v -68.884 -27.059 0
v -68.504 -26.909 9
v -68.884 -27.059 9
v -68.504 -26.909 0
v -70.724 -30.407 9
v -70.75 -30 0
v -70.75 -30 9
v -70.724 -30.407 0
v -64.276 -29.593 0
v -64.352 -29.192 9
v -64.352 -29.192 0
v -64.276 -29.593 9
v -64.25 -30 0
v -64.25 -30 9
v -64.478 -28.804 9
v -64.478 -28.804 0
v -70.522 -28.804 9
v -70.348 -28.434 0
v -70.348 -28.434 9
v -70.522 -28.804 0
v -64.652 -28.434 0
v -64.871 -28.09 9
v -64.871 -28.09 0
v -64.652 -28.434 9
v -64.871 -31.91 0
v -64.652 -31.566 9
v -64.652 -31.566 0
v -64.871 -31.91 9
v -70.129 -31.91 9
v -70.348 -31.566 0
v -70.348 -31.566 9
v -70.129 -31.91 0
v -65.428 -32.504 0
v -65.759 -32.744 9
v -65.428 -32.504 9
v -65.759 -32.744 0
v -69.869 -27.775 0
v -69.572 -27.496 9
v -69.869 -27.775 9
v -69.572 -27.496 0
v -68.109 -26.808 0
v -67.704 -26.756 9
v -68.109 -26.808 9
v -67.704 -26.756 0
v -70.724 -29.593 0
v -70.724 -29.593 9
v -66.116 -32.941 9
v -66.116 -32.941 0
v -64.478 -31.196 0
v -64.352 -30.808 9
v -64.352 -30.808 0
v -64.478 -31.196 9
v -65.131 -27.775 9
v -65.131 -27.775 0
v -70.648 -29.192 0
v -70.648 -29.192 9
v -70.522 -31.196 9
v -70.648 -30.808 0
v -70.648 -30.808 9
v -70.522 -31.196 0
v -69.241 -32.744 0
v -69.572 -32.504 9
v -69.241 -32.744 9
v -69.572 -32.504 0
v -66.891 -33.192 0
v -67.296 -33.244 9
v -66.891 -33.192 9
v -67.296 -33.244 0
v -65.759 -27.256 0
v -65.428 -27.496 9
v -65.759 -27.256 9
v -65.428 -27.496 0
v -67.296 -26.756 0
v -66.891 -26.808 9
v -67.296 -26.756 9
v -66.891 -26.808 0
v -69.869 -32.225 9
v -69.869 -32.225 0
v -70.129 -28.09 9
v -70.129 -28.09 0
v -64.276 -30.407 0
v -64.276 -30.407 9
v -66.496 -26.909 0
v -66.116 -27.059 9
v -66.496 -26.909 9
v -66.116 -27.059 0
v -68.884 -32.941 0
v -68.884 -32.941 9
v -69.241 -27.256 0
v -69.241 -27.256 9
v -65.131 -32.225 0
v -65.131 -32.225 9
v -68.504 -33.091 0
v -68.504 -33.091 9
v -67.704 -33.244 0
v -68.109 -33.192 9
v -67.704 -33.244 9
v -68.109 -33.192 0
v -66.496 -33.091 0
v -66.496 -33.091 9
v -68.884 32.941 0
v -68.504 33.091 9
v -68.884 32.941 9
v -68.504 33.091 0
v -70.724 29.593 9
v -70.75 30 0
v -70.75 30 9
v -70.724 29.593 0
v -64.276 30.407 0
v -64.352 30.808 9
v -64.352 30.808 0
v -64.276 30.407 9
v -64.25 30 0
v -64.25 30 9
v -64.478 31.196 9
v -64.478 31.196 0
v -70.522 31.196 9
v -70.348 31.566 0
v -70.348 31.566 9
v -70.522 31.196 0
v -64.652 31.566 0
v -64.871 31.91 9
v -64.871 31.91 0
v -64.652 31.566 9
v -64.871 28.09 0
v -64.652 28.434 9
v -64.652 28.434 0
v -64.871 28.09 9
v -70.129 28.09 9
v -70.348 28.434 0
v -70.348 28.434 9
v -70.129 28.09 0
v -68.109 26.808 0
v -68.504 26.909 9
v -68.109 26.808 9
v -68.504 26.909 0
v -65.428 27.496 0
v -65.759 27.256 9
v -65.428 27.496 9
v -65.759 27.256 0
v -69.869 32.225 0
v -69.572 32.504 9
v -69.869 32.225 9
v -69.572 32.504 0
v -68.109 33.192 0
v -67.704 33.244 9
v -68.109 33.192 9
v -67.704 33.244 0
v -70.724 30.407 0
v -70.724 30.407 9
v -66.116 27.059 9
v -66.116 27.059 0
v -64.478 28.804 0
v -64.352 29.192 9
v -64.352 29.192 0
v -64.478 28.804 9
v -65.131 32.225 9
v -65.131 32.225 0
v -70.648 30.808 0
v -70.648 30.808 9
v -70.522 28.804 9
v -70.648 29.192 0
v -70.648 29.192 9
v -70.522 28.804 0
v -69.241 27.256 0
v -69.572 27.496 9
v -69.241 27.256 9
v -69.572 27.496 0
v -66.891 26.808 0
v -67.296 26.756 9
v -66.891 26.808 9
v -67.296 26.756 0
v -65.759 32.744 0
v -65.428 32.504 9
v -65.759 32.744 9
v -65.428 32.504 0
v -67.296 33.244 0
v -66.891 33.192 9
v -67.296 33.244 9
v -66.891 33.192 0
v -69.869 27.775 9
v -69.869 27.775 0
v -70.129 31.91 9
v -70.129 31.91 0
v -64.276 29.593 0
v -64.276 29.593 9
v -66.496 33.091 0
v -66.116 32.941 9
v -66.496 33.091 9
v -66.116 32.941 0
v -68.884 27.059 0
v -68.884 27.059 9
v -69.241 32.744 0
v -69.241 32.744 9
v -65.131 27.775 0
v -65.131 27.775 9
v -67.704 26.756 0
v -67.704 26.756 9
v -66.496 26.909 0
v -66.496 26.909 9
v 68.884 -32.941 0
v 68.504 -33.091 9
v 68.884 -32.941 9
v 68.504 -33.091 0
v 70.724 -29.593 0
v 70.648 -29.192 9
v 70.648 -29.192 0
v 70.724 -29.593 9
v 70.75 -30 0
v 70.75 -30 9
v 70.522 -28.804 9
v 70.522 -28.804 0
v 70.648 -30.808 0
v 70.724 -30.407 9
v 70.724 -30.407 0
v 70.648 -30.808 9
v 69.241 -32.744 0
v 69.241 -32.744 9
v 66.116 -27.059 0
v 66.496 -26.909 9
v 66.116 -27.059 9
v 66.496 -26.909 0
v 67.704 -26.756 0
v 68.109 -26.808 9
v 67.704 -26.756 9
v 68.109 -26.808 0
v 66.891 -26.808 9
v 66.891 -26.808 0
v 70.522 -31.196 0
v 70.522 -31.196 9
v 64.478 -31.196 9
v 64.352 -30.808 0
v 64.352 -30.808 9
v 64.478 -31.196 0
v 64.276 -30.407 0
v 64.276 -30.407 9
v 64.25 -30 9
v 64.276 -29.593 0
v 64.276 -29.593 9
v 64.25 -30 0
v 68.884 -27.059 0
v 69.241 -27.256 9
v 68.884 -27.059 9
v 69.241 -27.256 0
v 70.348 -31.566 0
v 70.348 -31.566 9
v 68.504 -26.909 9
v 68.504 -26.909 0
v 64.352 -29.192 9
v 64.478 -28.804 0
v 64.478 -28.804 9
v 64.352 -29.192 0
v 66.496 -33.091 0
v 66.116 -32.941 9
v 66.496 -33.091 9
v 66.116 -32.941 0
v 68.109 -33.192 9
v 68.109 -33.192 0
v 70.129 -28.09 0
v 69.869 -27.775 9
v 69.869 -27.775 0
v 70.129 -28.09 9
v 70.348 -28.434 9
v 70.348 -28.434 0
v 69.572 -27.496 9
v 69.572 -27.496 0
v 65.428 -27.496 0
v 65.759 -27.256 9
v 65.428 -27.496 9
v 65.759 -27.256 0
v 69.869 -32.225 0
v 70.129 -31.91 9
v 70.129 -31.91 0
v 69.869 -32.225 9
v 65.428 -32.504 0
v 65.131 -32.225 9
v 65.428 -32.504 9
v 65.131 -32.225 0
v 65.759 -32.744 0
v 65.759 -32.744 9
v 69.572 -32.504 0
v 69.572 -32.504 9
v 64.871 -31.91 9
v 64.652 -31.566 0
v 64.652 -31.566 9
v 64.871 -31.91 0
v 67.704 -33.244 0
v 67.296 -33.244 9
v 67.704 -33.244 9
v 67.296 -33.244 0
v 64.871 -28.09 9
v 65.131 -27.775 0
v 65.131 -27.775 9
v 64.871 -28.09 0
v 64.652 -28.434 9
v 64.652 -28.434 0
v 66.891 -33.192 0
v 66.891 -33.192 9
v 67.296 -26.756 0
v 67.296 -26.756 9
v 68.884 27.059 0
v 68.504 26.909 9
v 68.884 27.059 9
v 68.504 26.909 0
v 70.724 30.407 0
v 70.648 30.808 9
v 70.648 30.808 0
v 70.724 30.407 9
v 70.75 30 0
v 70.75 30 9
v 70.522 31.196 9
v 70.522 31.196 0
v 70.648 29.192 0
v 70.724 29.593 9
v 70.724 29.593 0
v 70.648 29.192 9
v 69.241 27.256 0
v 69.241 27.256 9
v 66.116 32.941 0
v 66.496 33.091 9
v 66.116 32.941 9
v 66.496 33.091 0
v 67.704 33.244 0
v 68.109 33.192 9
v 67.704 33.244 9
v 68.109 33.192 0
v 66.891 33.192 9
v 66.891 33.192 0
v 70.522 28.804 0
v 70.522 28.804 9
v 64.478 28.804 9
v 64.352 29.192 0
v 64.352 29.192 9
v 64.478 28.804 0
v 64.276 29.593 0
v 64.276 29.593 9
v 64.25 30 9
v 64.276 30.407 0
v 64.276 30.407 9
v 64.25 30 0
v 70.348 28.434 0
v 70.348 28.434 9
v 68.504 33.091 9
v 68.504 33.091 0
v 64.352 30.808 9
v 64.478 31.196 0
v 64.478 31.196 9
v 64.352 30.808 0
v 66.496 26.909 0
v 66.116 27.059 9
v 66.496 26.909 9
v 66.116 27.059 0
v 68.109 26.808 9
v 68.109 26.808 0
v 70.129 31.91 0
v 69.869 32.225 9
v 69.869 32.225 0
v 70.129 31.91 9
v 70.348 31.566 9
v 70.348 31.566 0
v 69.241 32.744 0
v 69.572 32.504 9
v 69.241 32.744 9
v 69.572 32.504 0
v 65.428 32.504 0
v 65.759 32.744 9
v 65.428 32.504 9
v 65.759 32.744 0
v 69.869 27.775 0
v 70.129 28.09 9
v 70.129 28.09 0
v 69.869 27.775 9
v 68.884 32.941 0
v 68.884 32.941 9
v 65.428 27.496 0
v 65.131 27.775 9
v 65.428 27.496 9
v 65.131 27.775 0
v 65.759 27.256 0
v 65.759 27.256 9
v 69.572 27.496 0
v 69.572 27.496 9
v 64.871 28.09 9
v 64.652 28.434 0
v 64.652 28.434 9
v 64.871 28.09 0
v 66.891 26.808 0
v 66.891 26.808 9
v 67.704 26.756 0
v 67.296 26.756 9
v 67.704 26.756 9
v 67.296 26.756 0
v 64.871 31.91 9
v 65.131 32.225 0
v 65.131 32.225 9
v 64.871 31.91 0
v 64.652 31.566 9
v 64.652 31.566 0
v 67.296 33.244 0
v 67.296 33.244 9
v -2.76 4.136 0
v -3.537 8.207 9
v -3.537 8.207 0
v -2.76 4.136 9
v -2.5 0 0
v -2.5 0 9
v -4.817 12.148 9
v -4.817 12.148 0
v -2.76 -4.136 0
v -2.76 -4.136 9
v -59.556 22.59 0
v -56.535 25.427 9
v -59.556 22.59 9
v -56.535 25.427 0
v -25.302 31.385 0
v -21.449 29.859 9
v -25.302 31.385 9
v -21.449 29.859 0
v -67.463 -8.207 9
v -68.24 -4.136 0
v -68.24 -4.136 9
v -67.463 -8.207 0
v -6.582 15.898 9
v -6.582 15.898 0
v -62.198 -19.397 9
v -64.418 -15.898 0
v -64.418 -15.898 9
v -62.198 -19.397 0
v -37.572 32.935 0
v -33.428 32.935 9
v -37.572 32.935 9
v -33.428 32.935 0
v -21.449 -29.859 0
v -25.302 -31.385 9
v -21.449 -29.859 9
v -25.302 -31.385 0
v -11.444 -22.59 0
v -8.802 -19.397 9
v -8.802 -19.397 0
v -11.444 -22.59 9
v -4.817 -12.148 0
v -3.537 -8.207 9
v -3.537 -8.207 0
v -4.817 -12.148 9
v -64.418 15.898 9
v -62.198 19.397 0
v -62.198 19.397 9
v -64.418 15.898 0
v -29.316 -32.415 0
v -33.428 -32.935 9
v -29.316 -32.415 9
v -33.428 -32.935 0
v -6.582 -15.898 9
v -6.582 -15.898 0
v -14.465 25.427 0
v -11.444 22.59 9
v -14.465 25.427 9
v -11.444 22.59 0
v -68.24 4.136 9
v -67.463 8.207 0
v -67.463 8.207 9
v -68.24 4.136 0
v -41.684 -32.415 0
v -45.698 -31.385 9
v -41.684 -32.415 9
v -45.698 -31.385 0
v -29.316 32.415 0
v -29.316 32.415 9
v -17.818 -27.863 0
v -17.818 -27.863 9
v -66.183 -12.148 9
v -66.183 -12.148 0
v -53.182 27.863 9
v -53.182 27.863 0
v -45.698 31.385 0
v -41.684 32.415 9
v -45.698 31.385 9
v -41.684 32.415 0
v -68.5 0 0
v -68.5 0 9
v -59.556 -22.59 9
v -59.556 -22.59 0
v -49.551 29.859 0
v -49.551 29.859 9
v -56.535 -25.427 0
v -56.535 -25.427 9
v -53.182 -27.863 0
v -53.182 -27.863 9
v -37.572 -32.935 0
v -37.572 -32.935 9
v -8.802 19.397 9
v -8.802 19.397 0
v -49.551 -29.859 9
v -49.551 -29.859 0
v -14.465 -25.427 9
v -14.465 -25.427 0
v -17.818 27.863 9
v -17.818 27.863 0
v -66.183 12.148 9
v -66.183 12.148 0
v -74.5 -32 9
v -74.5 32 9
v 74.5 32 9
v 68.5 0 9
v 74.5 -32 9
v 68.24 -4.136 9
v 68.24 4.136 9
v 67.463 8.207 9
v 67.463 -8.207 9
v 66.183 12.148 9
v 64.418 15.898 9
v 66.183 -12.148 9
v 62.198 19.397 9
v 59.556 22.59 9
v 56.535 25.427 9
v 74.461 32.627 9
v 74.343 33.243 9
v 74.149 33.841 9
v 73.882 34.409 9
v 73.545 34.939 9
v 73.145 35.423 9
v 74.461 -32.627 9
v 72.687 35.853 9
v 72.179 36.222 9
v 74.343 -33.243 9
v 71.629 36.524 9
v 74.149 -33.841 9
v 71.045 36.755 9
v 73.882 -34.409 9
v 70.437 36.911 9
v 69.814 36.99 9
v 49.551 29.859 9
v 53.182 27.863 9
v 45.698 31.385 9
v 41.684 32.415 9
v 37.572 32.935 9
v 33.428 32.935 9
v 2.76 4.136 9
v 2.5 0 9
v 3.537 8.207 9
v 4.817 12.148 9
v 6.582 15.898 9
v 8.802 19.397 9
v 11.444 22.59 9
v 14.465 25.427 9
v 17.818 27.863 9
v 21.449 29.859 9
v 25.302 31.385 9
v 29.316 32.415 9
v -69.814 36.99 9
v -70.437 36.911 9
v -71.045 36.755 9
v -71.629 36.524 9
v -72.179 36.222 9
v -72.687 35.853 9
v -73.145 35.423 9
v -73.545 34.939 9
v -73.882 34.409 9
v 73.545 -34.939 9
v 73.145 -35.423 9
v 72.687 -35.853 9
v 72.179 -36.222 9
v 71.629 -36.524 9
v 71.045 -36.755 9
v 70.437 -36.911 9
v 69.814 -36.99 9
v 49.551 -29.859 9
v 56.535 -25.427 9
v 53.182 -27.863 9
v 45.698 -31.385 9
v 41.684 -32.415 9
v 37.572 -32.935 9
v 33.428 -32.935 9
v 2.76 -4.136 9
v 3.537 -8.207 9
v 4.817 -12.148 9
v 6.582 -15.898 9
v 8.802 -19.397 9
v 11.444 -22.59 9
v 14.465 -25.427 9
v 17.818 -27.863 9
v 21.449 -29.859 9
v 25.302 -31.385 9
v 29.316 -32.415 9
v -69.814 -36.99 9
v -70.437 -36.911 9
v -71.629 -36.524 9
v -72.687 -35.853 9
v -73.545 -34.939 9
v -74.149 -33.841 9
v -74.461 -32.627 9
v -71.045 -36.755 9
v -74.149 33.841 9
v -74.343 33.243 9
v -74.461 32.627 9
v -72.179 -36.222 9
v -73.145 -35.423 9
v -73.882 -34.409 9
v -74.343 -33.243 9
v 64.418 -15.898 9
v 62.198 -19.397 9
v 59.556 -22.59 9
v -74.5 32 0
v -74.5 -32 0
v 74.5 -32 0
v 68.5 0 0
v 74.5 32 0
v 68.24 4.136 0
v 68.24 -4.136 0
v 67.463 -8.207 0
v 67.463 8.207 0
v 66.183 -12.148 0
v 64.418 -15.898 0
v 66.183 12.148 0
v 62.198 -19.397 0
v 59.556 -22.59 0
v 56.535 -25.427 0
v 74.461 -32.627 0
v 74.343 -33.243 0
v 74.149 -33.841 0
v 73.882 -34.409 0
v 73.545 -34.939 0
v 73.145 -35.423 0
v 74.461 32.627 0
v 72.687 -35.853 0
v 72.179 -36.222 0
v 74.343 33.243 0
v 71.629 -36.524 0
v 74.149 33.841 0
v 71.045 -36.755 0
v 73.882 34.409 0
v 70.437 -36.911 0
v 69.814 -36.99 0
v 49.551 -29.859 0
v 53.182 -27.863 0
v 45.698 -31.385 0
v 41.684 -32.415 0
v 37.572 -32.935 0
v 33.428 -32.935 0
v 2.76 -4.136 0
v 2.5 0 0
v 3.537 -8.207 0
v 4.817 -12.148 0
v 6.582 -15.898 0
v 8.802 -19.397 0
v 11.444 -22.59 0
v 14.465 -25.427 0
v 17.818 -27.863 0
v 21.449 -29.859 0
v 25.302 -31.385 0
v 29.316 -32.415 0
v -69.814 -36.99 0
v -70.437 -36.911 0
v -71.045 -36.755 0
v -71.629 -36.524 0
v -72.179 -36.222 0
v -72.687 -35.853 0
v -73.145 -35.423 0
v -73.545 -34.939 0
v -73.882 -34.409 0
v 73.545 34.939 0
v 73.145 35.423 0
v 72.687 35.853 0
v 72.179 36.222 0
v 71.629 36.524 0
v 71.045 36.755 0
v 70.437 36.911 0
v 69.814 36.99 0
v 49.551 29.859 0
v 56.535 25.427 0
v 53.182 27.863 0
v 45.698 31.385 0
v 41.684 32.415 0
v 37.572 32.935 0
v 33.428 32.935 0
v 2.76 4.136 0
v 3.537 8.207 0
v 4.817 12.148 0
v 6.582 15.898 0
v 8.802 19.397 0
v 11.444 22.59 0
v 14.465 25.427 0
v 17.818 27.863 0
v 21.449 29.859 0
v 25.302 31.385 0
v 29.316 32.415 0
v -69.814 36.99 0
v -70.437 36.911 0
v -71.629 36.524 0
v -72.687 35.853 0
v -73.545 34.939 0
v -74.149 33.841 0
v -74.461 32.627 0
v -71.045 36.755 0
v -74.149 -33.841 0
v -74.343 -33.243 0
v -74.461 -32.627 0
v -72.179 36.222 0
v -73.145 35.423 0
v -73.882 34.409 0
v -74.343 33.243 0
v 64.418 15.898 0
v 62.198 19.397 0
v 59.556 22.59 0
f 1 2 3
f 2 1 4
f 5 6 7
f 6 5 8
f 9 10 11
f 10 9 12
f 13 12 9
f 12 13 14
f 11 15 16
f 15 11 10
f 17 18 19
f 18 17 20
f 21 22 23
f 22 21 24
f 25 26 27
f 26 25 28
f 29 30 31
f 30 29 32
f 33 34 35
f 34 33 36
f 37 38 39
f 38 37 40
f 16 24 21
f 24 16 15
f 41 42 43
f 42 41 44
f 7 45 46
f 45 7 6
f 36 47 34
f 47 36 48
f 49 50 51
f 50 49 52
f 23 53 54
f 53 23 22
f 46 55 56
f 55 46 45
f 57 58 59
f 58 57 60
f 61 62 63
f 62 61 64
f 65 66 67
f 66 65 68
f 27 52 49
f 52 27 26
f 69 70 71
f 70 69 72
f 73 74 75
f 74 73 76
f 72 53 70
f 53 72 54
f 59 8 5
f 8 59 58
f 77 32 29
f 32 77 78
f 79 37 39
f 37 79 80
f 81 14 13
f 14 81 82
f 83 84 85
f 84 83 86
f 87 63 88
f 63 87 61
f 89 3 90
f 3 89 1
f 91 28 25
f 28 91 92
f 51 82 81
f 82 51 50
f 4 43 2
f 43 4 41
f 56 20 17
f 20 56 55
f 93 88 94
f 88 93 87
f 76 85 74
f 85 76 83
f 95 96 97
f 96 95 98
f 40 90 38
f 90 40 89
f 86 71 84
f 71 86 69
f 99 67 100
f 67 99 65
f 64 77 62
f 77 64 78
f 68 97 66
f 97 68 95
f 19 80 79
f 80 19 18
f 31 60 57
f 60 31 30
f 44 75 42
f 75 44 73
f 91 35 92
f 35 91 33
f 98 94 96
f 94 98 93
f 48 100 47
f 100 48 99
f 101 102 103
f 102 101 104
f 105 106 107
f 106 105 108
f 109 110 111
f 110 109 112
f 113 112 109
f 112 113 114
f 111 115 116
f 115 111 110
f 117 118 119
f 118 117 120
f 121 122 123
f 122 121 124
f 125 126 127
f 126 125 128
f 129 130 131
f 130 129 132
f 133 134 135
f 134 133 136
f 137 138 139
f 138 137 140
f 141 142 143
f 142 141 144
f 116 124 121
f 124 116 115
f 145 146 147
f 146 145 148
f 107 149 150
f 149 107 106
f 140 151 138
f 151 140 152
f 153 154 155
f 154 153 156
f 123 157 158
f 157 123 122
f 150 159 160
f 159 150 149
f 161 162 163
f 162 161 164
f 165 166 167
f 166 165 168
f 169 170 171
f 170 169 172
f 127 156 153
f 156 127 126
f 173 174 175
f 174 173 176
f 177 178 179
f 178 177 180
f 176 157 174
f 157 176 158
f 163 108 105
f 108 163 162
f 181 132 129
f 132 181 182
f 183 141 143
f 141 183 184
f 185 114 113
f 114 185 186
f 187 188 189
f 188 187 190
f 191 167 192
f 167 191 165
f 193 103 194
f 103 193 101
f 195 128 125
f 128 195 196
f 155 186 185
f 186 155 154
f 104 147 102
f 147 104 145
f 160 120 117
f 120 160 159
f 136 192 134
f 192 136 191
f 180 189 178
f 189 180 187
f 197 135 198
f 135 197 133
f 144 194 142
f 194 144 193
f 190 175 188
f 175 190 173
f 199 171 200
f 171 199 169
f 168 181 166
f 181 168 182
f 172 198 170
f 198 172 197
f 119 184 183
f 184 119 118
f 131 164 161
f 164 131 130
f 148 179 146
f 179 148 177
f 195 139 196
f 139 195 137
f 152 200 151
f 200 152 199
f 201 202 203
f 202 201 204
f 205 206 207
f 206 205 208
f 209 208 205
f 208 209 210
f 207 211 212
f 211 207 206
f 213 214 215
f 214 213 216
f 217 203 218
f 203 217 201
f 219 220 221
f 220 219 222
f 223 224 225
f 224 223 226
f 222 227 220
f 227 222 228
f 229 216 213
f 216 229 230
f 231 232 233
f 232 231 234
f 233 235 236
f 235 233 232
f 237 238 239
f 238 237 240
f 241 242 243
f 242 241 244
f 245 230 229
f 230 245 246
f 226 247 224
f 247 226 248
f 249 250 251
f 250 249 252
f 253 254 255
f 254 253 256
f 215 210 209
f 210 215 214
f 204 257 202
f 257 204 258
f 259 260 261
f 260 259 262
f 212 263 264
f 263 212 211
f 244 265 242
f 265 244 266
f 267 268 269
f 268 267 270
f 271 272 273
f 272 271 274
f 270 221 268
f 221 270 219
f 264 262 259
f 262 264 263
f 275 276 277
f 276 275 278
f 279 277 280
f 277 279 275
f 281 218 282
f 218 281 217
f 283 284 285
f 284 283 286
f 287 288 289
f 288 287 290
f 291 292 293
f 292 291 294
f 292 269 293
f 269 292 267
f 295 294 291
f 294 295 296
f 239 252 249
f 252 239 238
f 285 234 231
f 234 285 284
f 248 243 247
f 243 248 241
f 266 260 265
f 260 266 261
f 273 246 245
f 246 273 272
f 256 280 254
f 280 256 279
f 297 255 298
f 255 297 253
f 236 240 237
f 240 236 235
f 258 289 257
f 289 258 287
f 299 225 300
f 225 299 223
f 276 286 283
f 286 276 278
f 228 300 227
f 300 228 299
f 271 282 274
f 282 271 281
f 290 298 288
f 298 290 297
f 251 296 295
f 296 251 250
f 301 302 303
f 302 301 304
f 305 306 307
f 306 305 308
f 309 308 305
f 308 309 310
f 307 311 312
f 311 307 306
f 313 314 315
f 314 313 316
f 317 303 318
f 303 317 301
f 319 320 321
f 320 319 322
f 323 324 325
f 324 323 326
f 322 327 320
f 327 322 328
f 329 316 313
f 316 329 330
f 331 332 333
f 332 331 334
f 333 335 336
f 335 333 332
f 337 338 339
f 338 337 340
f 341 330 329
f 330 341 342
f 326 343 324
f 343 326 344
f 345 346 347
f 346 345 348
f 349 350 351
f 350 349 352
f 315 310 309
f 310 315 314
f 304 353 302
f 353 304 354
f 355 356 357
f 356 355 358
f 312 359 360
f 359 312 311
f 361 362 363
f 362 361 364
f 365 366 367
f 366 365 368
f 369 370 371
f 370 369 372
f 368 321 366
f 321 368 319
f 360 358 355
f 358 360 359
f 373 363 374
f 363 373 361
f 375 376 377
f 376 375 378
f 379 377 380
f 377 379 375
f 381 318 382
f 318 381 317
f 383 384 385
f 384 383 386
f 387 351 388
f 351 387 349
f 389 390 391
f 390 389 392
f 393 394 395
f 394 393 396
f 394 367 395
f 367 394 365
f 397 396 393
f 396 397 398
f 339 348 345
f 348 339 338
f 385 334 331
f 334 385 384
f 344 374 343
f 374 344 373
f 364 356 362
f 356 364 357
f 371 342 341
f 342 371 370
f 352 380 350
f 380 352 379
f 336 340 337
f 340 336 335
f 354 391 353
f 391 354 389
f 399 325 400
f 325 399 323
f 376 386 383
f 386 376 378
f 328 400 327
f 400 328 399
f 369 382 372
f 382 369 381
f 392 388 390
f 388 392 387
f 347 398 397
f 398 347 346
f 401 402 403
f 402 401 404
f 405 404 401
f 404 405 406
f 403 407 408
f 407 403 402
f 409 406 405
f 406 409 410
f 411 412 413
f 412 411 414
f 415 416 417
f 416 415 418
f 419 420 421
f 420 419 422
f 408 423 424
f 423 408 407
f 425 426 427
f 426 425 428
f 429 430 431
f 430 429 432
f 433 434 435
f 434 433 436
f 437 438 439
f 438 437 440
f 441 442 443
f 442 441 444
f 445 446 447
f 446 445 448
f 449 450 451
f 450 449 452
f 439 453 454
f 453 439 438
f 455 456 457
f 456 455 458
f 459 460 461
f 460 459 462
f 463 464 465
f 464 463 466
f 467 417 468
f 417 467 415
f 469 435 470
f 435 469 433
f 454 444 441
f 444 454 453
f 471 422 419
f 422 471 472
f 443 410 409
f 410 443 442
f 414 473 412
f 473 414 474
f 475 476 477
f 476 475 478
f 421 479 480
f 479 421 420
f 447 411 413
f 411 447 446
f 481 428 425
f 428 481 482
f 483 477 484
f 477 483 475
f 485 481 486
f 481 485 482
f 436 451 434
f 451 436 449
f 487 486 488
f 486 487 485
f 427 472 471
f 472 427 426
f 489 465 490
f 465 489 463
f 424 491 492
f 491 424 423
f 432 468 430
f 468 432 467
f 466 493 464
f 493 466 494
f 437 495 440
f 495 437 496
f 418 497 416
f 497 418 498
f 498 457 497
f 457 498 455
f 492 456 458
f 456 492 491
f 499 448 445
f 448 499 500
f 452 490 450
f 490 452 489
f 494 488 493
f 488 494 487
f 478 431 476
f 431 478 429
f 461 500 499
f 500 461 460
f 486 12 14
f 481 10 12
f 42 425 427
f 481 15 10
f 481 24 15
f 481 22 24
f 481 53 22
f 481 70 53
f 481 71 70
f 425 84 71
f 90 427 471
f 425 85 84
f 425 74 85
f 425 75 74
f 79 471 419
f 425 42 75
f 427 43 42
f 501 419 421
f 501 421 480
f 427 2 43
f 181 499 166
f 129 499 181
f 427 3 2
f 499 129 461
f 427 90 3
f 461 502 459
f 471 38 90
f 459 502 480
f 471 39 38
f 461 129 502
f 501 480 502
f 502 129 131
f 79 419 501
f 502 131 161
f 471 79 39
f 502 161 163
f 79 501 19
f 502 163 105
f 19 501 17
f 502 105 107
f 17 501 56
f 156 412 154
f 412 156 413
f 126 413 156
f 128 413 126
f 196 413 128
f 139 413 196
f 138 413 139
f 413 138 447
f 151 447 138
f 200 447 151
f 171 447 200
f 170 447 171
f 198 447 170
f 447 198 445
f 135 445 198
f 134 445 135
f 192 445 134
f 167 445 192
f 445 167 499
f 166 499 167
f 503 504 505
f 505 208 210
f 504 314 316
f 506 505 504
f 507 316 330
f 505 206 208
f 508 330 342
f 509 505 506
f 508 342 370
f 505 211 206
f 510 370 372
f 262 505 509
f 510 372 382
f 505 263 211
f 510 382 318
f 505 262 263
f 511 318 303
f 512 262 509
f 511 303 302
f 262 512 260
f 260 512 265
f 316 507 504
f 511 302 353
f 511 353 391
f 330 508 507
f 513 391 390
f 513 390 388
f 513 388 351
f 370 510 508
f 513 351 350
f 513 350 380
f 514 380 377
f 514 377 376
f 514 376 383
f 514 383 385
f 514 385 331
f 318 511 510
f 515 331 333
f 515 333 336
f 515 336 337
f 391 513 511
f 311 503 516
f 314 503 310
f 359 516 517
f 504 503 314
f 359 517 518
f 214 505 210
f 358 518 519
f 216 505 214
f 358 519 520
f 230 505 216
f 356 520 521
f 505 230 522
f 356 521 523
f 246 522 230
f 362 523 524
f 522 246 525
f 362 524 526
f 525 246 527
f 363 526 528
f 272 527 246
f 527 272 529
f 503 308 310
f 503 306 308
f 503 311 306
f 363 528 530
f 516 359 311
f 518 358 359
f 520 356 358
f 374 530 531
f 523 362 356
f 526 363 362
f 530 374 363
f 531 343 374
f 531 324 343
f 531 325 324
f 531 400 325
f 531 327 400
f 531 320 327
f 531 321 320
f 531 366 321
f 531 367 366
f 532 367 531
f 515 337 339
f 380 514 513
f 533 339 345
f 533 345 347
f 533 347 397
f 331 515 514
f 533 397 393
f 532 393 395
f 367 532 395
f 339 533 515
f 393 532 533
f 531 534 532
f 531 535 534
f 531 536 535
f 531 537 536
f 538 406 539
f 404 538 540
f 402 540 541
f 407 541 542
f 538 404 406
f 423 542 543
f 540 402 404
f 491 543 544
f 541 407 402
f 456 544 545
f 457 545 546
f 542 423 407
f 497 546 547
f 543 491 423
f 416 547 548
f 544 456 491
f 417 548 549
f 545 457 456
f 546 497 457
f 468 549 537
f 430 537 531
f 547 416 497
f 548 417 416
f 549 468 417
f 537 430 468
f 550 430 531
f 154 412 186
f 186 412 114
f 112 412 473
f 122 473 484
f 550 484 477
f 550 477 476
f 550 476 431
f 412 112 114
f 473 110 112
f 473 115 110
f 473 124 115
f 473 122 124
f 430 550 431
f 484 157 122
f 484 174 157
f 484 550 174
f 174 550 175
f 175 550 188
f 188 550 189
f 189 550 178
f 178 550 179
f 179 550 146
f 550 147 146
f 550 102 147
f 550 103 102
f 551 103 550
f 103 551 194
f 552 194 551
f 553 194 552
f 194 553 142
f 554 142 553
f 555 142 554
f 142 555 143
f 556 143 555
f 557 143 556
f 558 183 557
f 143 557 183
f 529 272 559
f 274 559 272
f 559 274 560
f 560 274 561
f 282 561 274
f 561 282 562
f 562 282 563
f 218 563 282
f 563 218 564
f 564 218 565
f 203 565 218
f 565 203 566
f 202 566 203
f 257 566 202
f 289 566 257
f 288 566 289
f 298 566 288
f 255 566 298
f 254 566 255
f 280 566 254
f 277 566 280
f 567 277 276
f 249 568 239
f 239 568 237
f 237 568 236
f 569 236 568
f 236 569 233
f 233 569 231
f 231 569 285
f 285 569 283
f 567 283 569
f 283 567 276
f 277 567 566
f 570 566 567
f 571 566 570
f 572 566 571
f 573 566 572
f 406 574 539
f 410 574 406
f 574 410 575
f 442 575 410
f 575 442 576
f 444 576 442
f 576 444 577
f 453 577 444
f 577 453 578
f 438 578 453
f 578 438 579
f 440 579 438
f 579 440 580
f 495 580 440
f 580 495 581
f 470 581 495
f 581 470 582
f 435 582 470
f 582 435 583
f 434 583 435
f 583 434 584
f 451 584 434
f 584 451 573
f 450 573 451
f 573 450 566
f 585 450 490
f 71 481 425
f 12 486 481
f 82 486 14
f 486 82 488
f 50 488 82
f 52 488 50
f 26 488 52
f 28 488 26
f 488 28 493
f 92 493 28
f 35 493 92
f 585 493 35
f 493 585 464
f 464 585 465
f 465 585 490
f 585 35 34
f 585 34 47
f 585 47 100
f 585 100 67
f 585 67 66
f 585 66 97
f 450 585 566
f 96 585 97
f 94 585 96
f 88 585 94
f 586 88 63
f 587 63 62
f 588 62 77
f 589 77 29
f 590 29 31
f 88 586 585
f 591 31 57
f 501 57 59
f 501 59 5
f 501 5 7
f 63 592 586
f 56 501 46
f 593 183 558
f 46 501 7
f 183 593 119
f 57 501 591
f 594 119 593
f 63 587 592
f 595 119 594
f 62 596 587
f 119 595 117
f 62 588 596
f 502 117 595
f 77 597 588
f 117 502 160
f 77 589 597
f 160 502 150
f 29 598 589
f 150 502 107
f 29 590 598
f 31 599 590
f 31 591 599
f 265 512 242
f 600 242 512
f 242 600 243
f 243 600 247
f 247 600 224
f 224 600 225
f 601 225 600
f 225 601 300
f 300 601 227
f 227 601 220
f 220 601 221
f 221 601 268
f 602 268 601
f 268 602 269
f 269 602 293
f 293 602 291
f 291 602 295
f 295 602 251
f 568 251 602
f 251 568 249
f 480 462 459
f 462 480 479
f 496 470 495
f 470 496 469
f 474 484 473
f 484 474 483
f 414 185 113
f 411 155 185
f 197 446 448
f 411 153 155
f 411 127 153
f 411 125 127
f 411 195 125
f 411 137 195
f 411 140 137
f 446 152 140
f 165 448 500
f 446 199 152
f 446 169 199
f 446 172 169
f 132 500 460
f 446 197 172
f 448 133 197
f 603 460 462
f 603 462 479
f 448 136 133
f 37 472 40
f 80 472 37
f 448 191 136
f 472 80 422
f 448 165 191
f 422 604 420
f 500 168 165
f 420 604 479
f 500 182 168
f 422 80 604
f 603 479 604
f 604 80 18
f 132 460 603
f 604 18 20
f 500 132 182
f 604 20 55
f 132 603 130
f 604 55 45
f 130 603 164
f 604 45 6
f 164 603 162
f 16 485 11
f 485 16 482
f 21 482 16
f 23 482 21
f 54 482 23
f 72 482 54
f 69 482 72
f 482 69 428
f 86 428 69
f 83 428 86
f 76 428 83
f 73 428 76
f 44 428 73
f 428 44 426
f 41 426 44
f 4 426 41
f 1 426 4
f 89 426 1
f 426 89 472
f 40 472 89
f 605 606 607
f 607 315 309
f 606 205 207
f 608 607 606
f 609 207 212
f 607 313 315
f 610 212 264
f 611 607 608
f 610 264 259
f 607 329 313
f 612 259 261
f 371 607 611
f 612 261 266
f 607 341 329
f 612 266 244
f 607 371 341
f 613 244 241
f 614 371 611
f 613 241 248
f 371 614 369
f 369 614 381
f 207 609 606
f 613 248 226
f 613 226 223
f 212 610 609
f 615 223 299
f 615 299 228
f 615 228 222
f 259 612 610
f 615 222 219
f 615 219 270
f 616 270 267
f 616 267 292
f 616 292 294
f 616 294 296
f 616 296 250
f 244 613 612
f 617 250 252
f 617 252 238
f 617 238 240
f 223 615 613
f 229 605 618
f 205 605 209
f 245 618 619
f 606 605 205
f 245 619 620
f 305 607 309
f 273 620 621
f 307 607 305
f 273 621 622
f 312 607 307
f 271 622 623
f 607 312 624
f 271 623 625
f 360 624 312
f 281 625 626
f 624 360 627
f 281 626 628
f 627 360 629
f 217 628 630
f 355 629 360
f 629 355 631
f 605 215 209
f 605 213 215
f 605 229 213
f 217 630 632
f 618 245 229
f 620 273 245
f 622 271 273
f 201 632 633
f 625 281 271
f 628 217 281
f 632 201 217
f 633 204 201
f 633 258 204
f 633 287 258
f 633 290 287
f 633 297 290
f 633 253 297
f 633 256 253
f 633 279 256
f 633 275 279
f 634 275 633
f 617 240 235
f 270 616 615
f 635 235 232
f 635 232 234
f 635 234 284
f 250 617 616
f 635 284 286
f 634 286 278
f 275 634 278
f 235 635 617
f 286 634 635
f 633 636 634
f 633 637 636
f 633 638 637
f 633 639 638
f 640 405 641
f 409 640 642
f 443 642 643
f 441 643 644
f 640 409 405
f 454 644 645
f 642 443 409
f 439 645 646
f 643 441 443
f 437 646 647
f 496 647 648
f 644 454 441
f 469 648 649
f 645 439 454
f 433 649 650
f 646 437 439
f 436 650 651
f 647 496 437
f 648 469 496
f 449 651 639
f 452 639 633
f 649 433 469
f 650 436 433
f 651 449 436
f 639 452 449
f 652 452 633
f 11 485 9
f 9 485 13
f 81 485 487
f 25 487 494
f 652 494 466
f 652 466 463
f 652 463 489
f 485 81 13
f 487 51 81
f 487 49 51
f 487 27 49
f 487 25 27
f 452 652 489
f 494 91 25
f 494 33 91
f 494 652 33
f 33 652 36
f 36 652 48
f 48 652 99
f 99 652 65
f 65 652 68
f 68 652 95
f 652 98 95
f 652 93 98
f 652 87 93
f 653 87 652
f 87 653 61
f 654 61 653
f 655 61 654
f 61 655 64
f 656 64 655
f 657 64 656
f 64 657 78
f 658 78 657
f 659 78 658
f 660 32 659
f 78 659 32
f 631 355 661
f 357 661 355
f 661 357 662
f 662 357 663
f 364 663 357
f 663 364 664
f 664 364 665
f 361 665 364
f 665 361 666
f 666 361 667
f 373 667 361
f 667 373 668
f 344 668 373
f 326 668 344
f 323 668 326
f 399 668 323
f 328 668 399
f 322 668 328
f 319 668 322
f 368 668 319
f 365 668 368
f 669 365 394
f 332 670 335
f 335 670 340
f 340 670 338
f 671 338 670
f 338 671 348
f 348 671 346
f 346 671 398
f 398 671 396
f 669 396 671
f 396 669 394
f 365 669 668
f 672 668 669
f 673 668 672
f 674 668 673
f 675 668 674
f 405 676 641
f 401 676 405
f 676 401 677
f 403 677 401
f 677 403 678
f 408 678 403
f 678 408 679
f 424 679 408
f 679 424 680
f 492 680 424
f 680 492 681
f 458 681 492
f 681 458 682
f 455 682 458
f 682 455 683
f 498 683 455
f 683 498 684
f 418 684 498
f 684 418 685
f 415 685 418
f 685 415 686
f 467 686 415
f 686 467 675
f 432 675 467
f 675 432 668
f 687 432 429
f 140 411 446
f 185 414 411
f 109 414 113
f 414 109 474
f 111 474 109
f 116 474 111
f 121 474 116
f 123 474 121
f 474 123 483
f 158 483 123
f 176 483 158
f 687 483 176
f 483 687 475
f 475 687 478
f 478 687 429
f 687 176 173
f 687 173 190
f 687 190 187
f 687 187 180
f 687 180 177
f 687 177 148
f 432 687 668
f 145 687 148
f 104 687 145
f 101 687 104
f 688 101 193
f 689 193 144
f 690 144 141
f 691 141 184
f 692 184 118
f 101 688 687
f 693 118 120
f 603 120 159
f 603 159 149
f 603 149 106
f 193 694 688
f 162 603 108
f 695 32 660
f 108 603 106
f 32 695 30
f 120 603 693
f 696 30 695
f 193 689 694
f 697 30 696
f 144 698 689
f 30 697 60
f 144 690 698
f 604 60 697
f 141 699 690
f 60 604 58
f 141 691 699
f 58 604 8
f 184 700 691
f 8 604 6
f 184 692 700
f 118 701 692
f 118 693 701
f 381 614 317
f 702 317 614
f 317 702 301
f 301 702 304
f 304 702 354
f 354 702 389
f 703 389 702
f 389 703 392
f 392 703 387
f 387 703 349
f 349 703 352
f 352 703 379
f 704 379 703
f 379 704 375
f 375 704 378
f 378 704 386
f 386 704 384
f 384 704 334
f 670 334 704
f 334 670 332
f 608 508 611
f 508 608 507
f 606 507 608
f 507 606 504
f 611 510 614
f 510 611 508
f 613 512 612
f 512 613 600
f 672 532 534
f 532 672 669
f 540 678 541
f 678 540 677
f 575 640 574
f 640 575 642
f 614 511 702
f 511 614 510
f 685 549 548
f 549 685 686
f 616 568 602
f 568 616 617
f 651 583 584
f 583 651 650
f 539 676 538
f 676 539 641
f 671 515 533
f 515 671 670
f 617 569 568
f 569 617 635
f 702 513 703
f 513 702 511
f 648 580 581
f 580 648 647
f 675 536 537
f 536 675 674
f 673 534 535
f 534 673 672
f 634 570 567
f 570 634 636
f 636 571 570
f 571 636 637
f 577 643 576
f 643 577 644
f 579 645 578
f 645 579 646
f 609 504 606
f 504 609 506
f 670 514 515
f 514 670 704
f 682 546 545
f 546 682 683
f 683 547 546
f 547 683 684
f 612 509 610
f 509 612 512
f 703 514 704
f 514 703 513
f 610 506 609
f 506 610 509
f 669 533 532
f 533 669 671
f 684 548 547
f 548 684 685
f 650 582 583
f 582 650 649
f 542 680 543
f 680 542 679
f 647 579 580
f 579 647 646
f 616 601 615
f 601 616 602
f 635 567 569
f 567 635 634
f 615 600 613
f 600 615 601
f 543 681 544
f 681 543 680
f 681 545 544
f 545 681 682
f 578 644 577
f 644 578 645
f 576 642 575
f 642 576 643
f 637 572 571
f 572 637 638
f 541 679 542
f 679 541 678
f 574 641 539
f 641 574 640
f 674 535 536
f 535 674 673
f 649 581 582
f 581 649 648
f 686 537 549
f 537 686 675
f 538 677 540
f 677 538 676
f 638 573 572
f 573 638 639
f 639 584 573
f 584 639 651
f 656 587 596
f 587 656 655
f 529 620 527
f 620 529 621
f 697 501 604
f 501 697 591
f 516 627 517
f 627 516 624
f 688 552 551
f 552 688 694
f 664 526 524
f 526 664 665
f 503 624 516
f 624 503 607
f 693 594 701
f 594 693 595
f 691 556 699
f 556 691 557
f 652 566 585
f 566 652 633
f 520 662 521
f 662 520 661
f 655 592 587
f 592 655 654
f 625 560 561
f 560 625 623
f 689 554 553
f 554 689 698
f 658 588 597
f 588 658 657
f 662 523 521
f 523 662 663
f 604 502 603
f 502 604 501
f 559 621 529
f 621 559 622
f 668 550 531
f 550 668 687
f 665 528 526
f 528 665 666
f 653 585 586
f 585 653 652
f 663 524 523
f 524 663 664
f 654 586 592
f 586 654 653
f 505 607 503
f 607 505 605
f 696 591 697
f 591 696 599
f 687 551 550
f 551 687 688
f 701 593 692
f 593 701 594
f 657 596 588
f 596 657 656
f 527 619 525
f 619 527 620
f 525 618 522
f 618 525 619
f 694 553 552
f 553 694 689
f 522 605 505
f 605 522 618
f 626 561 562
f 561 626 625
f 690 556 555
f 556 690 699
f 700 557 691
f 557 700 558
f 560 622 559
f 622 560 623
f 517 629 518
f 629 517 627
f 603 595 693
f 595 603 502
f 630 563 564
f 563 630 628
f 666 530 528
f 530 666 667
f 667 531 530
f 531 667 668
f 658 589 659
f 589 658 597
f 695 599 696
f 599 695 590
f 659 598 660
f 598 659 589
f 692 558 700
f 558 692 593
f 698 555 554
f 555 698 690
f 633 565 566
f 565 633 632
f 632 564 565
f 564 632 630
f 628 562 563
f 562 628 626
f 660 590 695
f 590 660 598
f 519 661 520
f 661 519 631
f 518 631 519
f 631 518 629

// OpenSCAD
$fn = 50;

difference() {
	union() {
		hull() {
			translate(v = [-69.5, 32.0, 0]) {
				cylinder(h = 9, r = 5);
			}
			translate(v = [69.5, 32.0, 0]) {
				cylinder(h = 9, r = 5);
			}
			translate(v = [-69.5, -32.0, 0]) {
				cylinder(h = 9, r = 5);
			}
			translate(v = [69.5, -32.0, 0]) {
				cylinder(h = 9, r = 5);
			}
		}
	}
	union() {
		translate(v = [-67.5, -30.0, -100.0]) {
			cylinder(h = 200, r = 3.25);
		}
		translate(v = [-67.5, 30.0, -100.0]) {
			cylinder(h = 200, r = 3.25);
		}
		translate(v = [67.5, -30.0, -100.0]) {
			cylinder(h = 200, r = 3.25);
		}
		translate(v = [67.5, 30.0, -100.0]) {
			cylinder(h = 200, r = 3.25);
		}
		translate(v = [-67.5, -30.0, -100.0]) {
			cylinder(h = 200, r = 1.8);
		}
		translate(v = [-67.5, 30.0, -100.0]) {
			cylinder(h = 200, r = 1.8);
		}
		translate(v = [67.5, -30.0, -100.0]) {
			cylinder(h = 200, r = 1.8);
		}
		translate(v = [67.5, 30.0, -100.0]) {
			cylinder(h = 200, r = 1.8);
		}
		translate(v = [-35.5, 0, 0.0]) {
			cylinder(h = 9, r = 33.0);
		}
		translate(v = [35.5, 0, 0.0]) {
			cylinder(h = 9, r = 33.0);
		}
	}
}
